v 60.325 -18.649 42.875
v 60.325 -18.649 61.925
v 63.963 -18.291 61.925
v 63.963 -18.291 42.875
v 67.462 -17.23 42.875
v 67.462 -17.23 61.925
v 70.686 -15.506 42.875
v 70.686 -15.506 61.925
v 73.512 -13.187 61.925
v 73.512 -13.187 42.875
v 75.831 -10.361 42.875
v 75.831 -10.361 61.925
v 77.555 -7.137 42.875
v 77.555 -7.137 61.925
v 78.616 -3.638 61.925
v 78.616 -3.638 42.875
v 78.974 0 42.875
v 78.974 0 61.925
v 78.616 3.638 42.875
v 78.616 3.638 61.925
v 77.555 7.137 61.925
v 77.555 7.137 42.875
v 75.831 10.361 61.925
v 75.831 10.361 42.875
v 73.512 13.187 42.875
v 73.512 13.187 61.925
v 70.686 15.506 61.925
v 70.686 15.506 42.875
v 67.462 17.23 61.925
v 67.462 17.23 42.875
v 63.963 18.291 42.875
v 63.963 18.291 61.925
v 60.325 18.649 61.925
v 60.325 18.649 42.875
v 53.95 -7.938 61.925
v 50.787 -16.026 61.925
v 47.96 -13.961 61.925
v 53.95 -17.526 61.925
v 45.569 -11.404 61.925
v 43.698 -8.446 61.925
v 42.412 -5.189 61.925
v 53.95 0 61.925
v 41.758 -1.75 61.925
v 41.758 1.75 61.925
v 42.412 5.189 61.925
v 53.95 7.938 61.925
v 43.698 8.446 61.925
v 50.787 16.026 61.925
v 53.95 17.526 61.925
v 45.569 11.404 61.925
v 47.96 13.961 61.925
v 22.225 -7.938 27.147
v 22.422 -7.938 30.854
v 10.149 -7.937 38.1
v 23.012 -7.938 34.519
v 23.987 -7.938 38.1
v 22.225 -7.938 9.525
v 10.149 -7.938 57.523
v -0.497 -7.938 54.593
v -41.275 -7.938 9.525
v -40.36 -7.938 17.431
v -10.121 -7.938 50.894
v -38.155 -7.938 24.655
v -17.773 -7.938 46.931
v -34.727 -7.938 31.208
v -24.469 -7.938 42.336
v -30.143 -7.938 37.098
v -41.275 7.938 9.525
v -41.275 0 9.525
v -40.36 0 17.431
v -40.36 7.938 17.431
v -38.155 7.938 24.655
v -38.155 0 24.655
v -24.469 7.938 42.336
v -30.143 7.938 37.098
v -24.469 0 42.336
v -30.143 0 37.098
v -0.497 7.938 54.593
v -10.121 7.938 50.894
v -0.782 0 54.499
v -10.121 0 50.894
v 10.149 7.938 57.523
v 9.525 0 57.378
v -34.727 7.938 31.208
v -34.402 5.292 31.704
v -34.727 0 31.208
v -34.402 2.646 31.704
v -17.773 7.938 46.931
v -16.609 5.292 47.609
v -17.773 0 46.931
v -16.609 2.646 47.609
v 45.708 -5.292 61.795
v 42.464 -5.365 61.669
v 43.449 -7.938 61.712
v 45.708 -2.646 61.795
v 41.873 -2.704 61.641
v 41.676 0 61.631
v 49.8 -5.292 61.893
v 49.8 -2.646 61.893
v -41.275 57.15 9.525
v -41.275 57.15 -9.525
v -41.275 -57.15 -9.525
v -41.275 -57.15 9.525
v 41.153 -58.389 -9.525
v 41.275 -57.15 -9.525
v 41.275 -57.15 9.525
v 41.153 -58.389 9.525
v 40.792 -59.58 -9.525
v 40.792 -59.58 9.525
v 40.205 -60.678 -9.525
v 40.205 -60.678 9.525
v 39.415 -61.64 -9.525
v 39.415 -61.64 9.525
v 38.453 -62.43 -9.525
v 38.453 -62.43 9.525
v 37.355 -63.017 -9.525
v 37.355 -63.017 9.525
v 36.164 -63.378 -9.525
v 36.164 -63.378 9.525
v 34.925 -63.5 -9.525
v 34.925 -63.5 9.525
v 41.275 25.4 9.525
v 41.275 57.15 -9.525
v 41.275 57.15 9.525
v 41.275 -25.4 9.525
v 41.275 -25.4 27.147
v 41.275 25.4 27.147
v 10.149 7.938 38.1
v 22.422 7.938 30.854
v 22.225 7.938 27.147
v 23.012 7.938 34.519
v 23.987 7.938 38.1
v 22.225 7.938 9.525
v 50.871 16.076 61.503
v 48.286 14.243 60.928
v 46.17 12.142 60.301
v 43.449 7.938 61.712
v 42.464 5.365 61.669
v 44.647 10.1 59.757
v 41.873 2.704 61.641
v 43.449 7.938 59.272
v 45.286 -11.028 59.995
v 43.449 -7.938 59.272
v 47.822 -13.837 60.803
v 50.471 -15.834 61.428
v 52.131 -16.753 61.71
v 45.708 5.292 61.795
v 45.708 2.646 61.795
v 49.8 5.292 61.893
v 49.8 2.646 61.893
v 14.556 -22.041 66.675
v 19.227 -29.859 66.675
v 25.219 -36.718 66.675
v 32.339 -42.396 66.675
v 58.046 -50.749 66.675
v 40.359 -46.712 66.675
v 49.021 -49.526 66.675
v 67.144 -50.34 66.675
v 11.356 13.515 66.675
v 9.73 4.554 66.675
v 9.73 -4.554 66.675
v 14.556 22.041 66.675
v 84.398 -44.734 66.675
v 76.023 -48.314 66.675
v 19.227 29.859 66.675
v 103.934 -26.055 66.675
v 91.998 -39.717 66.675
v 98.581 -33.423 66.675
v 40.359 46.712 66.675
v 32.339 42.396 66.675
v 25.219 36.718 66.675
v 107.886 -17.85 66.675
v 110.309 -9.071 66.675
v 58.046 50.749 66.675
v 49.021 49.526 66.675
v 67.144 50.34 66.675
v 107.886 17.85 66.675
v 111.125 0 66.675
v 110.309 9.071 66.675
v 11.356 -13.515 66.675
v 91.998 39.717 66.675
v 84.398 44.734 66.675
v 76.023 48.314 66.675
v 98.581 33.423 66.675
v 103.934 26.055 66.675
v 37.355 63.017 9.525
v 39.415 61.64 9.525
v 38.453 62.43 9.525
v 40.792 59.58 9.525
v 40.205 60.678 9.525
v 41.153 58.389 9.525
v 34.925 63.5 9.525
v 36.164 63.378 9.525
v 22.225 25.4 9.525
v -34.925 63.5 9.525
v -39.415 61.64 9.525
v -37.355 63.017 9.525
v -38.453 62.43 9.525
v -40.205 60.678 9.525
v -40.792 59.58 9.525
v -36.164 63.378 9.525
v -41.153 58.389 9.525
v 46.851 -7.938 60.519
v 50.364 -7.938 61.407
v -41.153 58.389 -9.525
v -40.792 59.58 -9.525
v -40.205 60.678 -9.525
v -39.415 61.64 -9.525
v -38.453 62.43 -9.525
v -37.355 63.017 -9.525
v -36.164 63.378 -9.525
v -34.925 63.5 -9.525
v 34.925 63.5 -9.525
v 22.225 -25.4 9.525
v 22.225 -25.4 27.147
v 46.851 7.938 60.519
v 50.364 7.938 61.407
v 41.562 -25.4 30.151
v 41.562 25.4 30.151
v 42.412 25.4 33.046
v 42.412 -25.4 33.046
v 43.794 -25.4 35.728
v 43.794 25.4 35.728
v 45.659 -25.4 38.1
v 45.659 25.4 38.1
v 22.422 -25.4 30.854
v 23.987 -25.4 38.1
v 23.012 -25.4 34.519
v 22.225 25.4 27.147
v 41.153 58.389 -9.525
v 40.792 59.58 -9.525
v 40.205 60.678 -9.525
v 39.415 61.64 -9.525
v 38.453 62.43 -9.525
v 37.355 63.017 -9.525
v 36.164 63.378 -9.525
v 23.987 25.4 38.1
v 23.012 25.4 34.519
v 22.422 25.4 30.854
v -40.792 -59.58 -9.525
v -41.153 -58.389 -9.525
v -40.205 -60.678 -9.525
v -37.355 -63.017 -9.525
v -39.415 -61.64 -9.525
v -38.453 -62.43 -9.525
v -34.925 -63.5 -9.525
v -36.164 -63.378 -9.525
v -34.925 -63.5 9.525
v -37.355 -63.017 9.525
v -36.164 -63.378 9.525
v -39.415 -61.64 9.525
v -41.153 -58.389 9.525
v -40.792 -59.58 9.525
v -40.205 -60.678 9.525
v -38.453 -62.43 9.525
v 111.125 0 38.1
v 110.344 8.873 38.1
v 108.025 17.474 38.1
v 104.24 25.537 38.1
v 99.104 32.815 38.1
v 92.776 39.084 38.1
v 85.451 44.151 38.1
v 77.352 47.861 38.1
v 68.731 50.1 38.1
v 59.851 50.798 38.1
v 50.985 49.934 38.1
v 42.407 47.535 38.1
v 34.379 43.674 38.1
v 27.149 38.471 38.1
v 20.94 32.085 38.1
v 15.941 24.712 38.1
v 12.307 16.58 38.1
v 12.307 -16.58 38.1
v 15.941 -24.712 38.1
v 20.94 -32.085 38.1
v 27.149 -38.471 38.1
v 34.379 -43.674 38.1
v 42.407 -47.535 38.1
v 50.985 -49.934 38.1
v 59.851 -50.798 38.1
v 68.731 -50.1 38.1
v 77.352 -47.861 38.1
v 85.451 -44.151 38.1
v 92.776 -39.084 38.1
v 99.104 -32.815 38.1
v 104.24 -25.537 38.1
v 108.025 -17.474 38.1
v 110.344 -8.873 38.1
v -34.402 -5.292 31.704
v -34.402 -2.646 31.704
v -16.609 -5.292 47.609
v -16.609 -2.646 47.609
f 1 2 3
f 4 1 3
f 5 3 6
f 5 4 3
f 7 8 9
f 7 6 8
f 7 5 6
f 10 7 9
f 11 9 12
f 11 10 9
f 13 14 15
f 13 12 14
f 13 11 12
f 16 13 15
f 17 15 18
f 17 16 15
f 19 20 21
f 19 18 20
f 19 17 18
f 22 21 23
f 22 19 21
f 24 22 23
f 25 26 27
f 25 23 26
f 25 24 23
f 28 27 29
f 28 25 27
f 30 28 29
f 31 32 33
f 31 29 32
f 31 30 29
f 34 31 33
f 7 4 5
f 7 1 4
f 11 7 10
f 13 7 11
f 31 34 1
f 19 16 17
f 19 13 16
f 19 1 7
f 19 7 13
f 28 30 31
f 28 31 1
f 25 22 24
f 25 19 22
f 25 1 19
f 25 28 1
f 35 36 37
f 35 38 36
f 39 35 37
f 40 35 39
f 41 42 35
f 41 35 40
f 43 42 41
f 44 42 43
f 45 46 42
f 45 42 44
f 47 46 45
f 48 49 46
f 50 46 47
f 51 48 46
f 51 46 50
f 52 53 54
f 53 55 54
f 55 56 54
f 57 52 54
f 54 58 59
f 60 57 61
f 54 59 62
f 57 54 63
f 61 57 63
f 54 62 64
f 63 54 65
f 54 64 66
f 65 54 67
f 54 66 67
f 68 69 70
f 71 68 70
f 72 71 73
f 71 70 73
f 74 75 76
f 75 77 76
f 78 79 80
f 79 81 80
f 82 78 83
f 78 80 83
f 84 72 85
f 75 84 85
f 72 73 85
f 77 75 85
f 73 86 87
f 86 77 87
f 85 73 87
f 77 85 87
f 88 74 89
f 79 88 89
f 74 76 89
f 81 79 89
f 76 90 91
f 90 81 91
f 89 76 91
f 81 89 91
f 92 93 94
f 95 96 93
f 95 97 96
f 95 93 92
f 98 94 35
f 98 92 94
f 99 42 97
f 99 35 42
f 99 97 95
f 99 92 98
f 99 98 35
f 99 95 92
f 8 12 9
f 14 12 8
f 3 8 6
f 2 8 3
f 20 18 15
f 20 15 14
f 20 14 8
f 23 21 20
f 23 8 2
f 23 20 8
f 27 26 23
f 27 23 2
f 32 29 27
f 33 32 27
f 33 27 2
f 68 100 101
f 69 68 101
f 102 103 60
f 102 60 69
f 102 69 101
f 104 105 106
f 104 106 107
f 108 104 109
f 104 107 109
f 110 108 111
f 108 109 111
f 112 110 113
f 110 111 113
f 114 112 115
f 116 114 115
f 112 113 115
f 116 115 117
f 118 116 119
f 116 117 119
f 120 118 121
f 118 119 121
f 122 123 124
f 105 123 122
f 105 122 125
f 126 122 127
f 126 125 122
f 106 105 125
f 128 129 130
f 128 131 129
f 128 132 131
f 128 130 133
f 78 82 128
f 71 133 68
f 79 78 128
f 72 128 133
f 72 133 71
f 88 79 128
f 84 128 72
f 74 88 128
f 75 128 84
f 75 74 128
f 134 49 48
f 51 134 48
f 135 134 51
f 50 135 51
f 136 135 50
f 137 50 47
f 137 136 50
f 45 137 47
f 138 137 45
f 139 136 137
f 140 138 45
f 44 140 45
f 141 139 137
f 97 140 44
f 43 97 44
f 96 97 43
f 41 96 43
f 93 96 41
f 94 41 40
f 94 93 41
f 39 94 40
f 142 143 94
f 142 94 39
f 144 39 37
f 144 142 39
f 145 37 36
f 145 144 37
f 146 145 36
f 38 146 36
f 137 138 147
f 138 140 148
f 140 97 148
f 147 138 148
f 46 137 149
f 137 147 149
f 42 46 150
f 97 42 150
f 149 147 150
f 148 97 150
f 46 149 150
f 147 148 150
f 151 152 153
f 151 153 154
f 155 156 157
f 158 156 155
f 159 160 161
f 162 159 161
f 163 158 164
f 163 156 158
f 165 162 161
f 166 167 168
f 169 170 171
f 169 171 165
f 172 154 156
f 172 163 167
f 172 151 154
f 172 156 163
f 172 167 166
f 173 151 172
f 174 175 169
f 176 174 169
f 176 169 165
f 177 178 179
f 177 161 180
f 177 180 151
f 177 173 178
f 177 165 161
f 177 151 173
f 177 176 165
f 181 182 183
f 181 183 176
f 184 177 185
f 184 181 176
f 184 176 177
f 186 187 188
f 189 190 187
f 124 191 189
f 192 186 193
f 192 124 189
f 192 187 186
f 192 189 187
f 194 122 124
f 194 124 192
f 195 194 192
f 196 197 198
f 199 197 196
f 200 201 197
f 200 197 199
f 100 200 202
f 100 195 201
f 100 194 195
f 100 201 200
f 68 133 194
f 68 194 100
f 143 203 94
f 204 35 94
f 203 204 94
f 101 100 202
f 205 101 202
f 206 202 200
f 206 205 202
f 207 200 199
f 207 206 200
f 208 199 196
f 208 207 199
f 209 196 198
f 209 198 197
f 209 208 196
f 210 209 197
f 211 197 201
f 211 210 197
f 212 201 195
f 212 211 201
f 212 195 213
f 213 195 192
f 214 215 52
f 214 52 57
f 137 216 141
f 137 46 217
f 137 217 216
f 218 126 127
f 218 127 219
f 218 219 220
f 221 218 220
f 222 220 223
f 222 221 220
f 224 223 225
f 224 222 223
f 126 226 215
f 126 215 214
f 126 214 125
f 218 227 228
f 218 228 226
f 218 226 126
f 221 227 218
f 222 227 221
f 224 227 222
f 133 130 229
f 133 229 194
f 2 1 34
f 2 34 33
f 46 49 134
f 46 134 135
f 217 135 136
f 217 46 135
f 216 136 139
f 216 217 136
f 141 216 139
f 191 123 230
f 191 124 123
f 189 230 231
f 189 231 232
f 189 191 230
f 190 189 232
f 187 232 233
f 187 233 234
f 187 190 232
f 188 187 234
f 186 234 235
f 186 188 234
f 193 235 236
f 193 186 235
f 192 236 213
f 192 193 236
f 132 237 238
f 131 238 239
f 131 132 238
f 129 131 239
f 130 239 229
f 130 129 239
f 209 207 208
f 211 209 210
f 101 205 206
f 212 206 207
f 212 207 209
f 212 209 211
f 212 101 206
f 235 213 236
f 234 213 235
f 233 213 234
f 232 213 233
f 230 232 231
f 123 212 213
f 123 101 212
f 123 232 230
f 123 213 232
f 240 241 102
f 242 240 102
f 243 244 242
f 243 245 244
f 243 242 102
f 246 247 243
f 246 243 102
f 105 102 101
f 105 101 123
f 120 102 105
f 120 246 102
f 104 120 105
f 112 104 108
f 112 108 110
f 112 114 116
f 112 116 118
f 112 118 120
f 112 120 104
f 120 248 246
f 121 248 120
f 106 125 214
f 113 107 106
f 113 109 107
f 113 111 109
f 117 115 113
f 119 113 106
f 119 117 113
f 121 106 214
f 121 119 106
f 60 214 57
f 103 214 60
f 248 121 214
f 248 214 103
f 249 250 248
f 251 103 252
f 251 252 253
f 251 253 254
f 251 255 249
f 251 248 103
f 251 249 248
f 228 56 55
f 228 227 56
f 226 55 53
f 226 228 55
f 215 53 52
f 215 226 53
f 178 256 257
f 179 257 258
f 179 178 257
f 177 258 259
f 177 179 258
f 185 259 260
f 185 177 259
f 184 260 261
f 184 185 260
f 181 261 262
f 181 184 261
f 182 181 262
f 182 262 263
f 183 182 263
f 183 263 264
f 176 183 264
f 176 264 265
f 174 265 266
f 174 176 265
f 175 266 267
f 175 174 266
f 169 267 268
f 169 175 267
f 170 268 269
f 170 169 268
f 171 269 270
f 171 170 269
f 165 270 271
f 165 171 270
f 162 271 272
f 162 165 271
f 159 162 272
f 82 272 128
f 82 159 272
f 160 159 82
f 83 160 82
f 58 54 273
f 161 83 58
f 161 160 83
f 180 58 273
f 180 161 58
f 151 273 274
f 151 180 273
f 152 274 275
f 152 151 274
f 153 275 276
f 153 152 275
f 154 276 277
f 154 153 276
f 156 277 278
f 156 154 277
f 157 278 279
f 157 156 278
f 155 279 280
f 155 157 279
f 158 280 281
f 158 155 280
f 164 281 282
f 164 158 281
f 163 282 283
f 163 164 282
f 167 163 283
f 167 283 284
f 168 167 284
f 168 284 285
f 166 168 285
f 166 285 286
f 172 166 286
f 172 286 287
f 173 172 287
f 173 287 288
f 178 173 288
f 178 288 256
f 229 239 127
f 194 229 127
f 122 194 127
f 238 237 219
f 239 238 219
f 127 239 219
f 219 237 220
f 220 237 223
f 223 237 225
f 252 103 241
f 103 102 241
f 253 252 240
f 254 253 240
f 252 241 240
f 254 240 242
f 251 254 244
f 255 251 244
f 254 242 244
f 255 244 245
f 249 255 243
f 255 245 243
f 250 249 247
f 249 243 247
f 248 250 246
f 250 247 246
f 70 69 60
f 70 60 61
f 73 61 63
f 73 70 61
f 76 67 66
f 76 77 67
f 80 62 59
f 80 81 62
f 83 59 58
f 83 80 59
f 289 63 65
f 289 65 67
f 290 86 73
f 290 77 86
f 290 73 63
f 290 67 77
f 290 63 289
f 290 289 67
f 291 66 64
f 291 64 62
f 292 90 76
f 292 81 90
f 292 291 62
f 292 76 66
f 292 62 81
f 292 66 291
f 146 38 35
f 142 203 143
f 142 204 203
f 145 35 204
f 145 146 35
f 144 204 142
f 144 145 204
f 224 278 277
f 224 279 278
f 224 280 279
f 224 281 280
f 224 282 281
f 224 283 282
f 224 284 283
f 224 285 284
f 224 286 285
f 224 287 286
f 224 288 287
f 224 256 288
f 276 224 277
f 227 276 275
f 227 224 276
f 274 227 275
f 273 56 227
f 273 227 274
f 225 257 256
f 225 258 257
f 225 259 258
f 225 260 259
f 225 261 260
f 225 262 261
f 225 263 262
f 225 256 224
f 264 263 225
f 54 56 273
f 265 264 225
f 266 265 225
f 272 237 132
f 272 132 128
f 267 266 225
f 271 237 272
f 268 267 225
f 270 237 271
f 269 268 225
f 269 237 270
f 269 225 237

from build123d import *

# Parameters (mm, degrees)
F1_DEPTH = 63.5
F2_DEPTH = 25.4
F3_DEPTH = 7.9375
F5_R     = 6.35


with BuildPart() as f1:
    # F0 (on Front) → F1 (new body, symmetric)
    with BuildSketch(Plane.XZ):
        Polygon((22.225, 9.525), (-41.275, 9.525), (-41.275, -9.525), (41.275, -9.525), (41.275, 9.525), align=None)
    extrude(amount=F1_DEPTH, both=True)

    # F0 (on Front) → F2 (join, symmetric)
    with BuildSketch(Plane.XZ):
        with BuildLine():
            Line((22.225, 27.147116), (22.225, 9.525))
            Line((22.225, 9.525), (41.275, 9.525))
            Line((41.275, 9.525), (41.275, 27.147116))
            ThreePointArc((41.275, 27.147116), (45.187089, 37.582842), (54.995237, 42.8752))
            Line((54.995237, 42.8752), (60.325, 42.8752))
            Line((60.325, 42.8752), (60.325, 61.9252))
            Line((60.325, 61.9252), (53.949921, 61.9252))
            ThreePointArc((53.949921, 61.9252), (31.34769, 50.684245), (22.225, 27.147116))
        make_face()
    extrude(amount=F2_DEPTH, both=True)

    # F0 (on Front) → F3 (join, symmetric)
    with BuildSketch(Plane.XZ):
        with BuildLine():
            add(Edge.make_bspline(
                [(-41.275, 9.525), (-40.190469, 45.686379), (0, 61.9252), (53.949921, 61.9252)],
                knots=[0, 0, 0, 0, 108.690232, 108.690232, 108.690232, 108.690232], degree=3))
            Line((-41.275, 9.525), (22.225, 9.525))
            Line((22.225, 9.525), (22.225, 27.147116))
            ThreePointArc((22.225, 27.147116), (31.34769, 50.684245), (53.949921, 61.9252))
        make_face()
    extrude(amount=F3_DEPTH, both=True)

    # F0 (on Front) → F4 (revolve)
    with BuildSketch(Plane.XZ):
        Polygon((60.325, 66.675), (60.325, 61.9252), (78.97443, 61.9252), (78.97443, 42.8752), (60.325, 42.8752), (60.325, 38.1), (111.125, 38.1), (111.125, 66.675), align=None)
    revolve(axis=Axis((60.325, 0, 52.3875), (0, 0, 1)))

    # F5
    f5_edges = [f1.edges().sort_by_distance(p)[0] for p in [
        (-41.275, -63.5, 0),
        (41.275, -63.5, 0),
        (41.275, 63.5, 0),
        (-41.275, 63.5, 0),
    ]]
    fillet(f5_edges, radius=F5_R)


solid = f1.part
